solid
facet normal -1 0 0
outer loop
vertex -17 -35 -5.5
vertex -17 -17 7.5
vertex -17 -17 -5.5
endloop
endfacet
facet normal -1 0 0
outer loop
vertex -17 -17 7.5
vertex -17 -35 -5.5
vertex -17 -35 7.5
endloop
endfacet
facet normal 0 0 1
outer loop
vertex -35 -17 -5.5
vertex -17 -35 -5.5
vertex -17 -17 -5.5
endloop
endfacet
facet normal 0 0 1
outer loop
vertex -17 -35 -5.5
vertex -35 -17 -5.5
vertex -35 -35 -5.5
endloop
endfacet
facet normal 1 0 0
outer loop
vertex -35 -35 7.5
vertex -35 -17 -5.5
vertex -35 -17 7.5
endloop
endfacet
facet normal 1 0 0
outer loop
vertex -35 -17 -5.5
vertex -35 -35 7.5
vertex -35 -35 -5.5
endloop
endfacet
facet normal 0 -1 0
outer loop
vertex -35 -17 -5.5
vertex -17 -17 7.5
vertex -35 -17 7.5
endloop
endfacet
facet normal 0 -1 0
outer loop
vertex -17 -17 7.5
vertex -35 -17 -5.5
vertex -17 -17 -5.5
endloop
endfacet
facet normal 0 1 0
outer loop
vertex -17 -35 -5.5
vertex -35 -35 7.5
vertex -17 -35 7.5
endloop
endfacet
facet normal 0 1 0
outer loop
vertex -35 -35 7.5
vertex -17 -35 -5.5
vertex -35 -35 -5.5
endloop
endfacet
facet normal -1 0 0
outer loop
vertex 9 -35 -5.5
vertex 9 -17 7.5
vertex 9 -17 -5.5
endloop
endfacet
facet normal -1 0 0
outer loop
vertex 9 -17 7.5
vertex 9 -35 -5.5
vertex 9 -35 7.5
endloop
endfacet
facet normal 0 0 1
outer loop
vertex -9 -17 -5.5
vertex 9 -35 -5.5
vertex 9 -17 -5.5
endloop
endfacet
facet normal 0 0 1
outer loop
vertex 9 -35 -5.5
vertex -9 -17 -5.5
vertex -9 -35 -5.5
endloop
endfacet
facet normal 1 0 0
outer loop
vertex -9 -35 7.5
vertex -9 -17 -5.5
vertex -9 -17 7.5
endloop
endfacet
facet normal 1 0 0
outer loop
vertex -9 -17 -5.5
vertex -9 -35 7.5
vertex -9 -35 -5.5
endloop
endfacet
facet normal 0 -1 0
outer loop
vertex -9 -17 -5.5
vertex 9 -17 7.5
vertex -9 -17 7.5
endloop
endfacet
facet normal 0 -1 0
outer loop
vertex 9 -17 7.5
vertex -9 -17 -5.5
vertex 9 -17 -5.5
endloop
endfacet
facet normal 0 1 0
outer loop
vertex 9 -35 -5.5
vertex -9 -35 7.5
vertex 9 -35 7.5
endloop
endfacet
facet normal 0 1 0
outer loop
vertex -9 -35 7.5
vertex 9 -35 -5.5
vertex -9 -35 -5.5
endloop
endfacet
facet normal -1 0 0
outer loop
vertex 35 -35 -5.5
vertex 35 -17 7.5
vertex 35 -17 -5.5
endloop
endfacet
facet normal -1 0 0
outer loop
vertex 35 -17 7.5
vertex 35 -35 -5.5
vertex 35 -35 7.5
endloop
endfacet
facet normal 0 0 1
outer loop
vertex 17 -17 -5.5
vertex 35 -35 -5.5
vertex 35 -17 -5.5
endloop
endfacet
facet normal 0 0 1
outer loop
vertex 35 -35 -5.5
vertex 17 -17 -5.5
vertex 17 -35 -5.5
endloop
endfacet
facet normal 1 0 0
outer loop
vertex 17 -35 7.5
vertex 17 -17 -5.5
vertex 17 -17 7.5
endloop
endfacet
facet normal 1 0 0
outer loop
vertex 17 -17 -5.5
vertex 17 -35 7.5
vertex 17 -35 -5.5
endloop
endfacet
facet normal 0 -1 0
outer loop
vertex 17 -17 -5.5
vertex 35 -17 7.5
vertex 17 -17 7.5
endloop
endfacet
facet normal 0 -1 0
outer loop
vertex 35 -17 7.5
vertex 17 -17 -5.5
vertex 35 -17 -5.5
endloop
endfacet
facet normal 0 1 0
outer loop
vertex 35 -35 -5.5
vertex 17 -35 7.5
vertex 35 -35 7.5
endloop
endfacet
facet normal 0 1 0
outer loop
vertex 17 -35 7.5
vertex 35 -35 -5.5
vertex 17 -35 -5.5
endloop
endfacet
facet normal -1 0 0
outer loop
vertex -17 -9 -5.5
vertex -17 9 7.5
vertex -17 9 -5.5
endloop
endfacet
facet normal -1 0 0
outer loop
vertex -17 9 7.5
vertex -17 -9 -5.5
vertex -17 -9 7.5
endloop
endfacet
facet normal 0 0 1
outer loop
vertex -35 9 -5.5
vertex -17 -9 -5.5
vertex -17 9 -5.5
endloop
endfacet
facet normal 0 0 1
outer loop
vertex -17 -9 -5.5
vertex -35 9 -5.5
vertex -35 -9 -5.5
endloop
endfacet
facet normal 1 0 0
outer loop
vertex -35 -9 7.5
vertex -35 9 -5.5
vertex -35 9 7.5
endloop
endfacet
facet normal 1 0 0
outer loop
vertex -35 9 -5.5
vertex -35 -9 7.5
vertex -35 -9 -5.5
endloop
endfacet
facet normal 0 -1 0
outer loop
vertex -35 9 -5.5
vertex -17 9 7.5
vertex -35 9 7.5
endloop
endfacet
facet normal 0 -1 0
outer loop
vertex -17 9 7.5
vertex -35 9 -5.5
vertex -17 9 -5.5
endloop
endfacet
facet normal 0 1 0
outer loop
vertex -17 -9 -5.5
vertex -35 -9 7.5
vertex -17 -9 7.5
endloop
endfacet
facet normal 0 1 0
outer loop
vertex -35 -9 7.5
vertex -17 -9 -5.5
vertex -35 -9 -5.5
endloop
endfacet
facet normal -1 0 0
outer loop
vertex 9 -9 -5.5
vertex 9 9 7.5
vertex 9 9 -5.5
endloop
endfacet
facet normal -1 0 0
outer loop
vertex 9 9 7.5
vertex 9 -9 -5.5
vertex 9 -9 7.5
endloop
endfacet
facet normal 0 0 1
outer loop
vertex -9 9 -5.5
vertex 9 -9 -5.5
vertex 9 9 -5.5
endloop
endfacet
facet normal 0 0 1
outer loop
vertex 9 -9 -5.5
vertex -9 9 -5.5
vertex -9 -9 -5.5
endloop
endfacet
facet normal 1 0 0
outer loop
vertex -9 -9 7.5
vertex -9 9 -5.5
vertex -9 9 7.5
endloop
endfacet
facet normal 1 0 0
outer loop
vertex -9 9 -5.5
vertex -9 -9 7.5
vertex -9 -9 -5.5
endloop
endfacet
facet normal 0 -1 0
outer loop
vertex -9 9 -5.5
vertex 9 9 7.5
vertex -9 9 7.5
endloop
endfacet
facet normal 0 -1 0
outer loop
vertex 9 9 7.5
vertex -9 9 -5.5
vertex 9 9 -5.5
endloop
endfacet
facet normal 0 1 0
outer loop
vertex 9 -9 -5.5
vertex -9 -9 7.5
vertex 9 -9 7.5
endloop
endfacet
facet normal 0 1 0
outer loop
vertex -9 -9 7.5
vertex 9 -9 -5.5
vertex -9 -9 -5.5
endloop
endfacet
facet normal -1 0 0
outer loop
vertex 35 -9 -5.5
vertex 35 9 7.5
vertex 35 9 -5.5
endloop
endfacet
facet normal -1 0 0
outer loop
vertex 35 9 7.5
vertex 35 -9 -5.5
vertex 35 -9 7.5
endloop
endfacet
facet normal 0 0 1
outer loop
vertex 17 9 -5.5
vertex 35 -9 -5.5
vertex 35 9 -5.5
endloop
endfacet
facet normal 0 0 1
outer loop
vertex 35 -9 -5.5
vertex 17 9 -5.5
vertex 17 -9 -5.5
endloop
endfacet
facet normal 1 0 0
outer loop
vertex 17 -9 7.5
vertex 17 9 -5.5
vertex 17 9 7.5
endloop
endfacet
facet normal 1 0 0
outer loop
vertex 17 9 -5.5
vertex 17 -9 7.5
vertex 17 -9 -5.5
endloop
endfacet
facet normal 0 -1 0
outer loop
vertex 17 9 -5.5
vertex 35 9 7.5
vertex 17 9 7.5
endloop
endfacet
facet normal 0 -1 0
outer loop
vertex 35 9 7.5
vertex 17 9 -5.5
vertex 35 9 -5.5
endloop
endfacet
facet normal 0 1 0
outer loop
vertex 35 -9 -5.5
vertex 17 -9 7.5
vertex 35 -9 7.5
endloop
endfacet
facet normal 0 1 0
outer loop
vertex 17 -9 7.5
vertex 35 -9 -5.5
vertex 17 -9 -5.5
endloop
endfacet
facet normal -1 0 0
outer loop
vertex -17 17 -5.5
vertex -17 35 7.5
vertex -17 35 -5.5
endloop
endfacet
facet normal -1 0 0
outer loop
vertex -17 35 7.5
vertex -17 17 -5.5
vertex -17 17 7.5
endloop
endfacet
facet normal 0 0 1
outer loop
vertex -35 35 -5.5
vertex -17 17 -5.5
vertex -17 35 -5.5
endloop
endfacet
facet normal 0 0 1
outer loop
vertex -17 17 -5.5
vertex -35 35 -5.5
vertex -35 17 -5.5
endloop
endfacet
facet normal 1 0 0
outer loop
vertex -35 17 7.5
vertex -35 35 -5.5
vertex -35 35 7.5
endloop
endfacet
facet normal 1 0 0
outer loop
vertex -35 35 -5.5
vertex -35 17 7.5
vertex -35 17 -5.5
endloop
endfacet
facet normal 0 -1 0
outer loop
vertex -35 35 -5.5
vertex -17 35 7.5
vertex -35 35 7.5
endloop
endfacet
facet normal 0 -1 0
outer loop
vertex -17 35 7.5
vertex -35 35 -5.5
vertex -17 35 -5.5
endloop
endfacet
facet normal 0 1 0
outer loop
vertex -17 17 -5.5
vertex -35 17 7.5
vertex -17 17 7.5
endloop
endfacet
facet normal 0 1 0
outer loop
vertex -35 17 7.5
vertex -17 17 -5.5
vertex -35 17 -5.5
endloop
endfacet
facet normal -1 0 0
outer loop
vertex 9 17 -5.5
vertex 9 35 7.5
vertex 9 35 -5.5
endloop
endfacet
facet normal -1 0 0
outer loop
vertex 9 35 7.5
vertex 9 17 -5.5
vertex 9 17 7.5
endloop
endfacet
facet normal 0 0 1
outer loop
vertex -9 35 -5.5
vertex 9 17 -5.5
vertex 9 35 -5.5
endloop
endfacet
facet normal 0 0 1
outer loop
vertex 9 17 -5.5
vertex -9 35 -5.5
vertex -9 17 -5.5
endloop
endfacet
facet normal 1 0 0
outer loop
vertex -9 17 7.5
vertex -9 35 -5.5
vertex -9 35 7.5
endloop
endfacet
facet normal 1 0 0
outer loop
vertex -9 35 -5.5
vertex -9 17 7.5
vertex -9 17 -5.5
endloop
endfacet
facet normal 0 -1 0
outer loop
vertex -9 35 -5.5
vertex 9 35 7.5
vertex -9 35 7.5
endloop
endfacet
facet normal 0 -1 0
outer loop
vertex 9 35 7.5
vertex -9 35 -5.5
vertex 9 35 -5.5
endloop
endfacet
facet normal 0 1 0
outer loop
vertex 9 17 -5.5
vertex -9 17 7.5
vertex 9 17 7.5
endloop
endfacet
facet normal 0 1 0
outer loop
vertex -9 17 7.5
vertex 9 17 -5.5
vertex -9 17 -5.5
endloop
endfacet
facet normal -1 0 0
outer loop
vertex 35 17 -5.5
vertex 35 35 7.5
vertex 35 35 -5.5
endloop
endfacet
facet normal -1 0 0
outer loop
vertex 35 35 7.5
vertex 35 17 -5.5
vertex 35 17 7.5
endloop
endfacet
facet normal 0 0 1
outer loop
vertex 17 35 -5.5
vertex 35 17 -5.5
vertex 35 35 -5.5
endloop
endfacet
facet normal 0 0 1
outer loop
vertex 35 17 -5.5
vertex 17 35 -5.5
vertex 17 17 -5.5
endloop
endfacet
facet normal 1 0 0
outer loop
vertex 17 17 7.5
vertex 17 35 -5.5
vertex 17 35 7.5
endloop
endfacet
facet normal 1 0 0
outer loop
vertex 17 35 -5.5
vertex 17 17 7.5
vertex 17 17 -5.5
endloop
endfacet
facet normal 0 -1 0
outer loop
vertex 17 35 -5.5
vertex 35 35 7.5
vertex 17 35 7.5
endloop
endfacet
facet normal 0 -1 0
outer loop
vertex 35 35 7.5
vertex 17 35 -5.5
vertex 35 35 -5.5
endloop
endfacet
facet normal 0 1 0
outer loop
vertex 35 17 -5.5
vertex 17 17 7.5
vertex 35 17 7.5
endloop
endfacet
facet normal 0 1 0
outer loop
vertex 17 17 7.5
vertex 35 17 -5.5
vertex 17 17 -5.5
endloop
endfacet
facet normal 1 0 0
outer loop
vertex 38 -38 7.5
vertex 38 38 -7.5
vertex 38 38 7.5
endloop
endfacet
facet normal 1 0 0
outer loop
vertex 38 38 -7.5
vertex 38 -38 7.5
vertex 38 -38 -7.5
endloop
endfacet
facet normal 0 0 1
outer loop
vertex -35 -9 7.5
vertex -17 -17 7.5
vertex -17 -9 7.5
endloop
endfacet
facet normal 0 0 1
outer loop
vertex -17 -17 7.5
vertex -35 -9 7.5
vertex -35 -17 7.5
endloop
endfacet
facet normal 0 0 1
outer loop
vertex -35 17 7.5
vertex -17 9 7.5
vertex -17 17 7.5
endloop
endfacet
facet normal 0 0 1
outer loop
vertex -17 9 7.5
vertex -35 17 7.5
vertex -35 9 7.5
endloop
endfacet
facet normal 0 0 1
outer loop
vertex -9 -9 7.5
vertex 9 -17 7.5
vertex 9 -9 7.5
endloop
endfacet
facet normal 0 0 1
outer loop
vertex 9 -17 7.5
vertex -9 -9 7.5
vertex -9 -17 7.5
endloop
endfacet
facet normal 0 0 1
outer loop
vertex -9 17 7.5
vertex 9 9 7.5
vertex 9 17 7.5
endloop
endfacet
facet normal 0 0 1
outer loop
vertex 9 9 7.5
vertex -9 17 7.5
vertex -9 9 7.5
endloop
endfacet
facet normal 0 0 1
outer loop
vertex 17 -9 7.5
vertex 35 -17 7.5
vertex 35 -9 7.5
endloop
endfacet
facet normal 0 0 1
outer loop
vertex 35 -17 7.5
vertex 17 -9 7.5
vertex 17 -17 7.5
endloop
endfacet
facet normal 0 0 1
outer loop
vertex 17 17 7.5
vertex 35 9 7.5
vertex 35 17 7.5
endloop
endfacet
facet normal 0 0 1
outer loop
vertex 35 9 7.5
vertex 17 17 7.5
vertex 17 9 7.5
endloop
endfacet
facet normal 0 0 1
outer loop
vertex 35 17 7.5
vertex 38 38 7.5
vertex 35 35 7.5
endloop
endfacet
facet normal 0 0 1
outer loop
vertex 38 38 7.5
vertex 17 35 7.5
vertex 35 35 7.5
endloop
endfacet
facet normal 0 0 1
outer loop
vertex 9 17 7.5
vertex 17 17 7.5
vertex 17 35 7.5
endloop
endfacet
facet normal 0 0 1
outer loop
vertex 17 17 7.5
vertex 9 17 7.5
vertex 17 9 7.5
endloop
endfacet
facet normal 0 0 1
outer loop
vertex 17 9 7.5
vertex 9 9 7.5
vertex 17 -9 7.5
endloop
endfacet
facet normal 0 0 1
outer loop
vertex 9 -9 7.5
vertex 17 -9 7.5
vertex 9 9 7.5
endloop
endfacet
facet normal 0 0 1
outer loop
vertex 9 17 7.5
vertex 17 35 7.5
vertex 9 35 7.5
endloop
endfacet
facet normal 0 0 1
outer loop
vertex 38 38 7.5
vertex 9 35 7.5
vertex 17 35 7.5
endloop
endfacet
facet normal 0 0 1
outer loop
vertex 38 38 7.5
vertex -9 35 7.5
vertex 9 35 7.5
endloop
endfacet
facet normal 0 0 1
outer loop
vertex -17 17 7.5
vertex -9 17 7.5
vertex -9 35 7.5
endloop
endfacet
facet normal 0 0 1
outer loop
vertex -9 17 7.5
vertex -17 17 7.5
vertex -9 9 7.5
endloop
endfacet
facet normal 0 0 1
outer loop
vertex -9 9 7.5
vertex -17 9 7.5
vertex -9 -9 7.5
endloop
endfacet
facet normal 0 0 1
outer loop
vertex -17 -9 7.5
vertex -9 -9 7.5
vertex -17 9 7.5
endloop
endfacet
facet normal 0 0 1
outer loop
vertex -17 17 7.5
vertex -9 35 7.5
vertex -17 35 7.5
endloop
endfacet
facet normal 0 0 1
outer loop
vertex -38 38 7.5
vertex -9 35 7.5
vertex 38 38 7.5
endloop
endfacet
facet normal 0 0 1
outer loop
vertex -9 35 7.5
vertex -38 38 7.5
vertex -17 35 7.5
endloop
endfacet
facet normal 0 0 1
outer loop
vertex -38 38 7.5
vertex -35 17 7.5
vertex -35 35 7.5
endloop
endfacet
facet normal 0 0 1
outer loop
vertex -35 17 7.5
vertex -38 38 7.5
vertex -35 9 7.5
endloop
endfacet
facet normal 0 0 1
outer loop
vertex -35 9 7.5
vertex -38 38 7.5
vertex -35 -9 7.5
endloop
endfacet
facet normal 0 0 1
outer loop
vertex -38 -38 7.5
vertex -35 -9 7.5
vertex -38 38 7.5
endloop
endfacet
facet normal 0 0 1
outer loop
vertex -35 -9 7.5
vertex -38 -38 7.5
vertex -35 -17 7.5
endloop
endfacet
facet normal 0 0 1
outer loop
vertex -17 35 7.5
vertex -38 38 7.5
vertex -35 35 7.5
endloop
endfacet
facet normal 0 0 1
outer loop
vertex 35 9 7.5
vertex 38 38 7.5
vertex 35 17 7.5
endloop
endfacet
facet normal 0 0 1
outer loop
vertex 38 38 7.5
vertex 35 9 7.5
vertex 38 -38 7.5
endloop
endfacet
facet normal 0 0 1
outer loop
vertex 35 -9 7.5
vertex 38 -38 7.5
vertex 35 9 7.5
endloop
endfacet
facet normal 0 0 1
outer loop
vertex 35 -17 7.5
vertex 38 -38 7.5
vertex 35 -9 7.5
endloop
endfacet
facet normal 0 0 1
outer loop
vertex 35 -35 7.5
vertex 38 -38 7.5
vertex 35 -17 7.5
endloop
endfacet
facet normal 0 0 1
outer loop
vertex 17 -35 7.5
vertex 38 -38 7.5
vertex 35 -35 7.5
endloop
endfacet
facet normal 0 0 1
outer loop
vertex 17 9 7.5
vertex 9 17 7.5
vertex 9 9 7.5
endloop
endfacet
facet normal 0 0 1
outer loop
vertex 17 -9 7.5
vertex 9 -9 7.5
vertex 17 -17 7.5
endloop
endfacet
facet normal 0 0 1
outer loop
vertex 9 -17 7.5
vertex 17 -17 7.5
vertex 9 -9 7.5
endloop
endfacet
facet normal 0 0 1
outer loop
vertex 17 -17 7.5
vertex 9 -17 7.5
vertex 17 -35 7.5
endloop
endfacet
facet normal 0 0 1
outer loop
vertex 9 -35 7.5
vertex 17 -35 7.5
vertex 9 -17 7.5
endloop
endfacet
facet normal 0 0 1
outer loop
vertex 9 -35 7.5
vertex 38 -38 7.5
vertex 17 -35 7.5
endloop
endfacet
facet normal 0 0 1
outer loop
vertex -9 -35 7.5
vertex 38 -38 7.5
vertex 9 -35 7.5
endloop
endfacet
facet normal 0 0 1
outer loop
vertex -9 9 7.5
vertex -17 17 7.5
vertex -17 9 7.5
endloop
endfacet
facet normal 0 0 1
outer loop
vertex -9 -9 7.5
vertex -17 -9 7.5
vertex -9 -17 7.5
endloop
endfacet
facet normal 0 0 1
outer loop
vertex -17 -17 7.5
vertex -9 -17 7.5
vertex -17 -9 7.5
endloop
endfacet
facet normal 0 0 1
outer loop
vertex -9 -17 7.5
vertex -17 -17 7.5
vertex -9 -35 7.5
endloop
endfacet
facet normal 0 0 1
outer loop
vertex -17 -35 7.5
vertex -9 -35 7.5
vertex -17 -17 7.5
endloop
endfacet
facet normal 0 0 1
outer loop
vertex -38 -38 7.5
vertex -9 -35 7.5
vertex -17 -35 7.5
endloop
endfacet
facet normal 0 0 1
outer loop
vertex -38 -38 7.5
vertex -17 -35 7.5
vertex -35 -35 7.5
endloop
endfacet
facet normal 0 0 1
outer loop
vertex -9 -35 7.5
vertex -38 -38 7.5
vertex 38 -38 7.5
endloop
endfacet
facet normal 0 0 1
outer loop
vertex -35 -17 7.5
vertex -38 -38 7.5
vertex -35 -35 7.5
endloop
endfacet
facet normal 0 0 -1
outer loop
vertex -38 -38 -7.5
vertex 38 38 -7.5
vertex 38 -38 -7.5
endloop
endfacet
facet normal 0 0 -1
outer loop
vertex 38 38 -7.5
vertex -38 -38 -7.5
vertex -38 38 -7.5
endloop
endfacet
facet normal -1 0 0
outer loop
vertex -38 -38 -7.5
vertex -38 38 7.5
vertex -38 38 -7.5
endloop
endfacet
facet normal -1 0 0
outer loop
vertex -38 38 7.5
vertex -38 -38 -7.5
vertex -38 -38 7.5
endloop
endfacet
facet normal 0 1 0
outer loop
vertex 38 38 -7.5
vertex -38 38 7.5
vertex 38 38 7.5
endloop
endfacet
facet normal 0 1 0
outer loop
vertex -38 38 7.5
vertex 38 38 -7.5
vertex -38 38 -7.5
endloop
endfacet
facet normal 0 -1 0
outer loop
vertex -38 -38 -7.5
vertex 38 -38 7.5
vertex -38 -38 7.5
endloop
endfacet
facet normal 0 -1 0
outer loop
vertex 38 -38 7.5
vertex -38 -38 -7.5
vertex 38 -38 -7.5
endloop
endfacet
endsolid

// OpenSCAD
$fn = 32;

// ----------------------------------------------------------------------
// Pocket plate 76 x 76 x 15
// 3 x 3 pockets 18 mm square, 13 mm deep
// ----------------------------------------------------------------------

// --- parameters (mm) ---
thickness = 15;  // plate thickness
floor_t = 2;     // material left under each pocket
pocket = 18;     // pocket side length
pitch_x = 26;    // pocket pitch along X
pitch_y = 26;    // pocket pitch along Y
cols = 3;        // pockets per row
rows = 3;        // rows of pockets

// --- derived feature positions (mm) ---
depth = thickness - floor_t;        // = 13   pocket depth, down to the floor
span_x = (cols - 1) * pitch_x;      // = 52   distance between outer pockets
span_y = (rows - 1) * pitch_y;      // = 52   distance between outer pocket rows
origin_x = -span_x / 2;             // = -26   X of the first pocket
origin_y = -span_y / 2;             // = -26   Y of the first pocket
plate = [span_x + pocket + 6, span_y + pocket + 6, thickness];  // = [76, 76, 15]   overall size: pockets plus 3 mm of wall on each side
feature_centers = [
  [origin_x + 0 * pitch_x, origin_y + 0 * pitch_y],
  [origin_x + 1 * pitch_x, origin_y + 0 * pitch_y],
  [origin_x + 2 * pitch_x, origin_y + 0 * pitch_y],
  [origin_x + 0 * pitch_x, origin_y + 1 * pitch_y],
  [origin_x + 1 * pitch_x, origin_y + 1 * pitch_y],
  [origin_x + 2 * pitch_x, origin_y + 1 * pitch_y],
  [origin_x + 0 * pitch_x, origin_y + 2 * pitch_y],
  [origin_x + 1 * pitch_x, origin_y + 2 * pitch_y],
  [origin_x + 2 * pitch_x, origin_y + 2 * pitch_y]
];   // pocket centres, used verbatim by the cutter loop

// plate outline, then one pocket per centre in feature_centers
difference() {
  cube(plate, center = true);
  for (centre = feature_centers)
    translate([centre[0] - pocket / 2, centre[1] - pocket / 2, plate[2] / 2 - depth])
      cube([pocket, pocket, depth + 1]);  // centred on the declared pocket centre
}
